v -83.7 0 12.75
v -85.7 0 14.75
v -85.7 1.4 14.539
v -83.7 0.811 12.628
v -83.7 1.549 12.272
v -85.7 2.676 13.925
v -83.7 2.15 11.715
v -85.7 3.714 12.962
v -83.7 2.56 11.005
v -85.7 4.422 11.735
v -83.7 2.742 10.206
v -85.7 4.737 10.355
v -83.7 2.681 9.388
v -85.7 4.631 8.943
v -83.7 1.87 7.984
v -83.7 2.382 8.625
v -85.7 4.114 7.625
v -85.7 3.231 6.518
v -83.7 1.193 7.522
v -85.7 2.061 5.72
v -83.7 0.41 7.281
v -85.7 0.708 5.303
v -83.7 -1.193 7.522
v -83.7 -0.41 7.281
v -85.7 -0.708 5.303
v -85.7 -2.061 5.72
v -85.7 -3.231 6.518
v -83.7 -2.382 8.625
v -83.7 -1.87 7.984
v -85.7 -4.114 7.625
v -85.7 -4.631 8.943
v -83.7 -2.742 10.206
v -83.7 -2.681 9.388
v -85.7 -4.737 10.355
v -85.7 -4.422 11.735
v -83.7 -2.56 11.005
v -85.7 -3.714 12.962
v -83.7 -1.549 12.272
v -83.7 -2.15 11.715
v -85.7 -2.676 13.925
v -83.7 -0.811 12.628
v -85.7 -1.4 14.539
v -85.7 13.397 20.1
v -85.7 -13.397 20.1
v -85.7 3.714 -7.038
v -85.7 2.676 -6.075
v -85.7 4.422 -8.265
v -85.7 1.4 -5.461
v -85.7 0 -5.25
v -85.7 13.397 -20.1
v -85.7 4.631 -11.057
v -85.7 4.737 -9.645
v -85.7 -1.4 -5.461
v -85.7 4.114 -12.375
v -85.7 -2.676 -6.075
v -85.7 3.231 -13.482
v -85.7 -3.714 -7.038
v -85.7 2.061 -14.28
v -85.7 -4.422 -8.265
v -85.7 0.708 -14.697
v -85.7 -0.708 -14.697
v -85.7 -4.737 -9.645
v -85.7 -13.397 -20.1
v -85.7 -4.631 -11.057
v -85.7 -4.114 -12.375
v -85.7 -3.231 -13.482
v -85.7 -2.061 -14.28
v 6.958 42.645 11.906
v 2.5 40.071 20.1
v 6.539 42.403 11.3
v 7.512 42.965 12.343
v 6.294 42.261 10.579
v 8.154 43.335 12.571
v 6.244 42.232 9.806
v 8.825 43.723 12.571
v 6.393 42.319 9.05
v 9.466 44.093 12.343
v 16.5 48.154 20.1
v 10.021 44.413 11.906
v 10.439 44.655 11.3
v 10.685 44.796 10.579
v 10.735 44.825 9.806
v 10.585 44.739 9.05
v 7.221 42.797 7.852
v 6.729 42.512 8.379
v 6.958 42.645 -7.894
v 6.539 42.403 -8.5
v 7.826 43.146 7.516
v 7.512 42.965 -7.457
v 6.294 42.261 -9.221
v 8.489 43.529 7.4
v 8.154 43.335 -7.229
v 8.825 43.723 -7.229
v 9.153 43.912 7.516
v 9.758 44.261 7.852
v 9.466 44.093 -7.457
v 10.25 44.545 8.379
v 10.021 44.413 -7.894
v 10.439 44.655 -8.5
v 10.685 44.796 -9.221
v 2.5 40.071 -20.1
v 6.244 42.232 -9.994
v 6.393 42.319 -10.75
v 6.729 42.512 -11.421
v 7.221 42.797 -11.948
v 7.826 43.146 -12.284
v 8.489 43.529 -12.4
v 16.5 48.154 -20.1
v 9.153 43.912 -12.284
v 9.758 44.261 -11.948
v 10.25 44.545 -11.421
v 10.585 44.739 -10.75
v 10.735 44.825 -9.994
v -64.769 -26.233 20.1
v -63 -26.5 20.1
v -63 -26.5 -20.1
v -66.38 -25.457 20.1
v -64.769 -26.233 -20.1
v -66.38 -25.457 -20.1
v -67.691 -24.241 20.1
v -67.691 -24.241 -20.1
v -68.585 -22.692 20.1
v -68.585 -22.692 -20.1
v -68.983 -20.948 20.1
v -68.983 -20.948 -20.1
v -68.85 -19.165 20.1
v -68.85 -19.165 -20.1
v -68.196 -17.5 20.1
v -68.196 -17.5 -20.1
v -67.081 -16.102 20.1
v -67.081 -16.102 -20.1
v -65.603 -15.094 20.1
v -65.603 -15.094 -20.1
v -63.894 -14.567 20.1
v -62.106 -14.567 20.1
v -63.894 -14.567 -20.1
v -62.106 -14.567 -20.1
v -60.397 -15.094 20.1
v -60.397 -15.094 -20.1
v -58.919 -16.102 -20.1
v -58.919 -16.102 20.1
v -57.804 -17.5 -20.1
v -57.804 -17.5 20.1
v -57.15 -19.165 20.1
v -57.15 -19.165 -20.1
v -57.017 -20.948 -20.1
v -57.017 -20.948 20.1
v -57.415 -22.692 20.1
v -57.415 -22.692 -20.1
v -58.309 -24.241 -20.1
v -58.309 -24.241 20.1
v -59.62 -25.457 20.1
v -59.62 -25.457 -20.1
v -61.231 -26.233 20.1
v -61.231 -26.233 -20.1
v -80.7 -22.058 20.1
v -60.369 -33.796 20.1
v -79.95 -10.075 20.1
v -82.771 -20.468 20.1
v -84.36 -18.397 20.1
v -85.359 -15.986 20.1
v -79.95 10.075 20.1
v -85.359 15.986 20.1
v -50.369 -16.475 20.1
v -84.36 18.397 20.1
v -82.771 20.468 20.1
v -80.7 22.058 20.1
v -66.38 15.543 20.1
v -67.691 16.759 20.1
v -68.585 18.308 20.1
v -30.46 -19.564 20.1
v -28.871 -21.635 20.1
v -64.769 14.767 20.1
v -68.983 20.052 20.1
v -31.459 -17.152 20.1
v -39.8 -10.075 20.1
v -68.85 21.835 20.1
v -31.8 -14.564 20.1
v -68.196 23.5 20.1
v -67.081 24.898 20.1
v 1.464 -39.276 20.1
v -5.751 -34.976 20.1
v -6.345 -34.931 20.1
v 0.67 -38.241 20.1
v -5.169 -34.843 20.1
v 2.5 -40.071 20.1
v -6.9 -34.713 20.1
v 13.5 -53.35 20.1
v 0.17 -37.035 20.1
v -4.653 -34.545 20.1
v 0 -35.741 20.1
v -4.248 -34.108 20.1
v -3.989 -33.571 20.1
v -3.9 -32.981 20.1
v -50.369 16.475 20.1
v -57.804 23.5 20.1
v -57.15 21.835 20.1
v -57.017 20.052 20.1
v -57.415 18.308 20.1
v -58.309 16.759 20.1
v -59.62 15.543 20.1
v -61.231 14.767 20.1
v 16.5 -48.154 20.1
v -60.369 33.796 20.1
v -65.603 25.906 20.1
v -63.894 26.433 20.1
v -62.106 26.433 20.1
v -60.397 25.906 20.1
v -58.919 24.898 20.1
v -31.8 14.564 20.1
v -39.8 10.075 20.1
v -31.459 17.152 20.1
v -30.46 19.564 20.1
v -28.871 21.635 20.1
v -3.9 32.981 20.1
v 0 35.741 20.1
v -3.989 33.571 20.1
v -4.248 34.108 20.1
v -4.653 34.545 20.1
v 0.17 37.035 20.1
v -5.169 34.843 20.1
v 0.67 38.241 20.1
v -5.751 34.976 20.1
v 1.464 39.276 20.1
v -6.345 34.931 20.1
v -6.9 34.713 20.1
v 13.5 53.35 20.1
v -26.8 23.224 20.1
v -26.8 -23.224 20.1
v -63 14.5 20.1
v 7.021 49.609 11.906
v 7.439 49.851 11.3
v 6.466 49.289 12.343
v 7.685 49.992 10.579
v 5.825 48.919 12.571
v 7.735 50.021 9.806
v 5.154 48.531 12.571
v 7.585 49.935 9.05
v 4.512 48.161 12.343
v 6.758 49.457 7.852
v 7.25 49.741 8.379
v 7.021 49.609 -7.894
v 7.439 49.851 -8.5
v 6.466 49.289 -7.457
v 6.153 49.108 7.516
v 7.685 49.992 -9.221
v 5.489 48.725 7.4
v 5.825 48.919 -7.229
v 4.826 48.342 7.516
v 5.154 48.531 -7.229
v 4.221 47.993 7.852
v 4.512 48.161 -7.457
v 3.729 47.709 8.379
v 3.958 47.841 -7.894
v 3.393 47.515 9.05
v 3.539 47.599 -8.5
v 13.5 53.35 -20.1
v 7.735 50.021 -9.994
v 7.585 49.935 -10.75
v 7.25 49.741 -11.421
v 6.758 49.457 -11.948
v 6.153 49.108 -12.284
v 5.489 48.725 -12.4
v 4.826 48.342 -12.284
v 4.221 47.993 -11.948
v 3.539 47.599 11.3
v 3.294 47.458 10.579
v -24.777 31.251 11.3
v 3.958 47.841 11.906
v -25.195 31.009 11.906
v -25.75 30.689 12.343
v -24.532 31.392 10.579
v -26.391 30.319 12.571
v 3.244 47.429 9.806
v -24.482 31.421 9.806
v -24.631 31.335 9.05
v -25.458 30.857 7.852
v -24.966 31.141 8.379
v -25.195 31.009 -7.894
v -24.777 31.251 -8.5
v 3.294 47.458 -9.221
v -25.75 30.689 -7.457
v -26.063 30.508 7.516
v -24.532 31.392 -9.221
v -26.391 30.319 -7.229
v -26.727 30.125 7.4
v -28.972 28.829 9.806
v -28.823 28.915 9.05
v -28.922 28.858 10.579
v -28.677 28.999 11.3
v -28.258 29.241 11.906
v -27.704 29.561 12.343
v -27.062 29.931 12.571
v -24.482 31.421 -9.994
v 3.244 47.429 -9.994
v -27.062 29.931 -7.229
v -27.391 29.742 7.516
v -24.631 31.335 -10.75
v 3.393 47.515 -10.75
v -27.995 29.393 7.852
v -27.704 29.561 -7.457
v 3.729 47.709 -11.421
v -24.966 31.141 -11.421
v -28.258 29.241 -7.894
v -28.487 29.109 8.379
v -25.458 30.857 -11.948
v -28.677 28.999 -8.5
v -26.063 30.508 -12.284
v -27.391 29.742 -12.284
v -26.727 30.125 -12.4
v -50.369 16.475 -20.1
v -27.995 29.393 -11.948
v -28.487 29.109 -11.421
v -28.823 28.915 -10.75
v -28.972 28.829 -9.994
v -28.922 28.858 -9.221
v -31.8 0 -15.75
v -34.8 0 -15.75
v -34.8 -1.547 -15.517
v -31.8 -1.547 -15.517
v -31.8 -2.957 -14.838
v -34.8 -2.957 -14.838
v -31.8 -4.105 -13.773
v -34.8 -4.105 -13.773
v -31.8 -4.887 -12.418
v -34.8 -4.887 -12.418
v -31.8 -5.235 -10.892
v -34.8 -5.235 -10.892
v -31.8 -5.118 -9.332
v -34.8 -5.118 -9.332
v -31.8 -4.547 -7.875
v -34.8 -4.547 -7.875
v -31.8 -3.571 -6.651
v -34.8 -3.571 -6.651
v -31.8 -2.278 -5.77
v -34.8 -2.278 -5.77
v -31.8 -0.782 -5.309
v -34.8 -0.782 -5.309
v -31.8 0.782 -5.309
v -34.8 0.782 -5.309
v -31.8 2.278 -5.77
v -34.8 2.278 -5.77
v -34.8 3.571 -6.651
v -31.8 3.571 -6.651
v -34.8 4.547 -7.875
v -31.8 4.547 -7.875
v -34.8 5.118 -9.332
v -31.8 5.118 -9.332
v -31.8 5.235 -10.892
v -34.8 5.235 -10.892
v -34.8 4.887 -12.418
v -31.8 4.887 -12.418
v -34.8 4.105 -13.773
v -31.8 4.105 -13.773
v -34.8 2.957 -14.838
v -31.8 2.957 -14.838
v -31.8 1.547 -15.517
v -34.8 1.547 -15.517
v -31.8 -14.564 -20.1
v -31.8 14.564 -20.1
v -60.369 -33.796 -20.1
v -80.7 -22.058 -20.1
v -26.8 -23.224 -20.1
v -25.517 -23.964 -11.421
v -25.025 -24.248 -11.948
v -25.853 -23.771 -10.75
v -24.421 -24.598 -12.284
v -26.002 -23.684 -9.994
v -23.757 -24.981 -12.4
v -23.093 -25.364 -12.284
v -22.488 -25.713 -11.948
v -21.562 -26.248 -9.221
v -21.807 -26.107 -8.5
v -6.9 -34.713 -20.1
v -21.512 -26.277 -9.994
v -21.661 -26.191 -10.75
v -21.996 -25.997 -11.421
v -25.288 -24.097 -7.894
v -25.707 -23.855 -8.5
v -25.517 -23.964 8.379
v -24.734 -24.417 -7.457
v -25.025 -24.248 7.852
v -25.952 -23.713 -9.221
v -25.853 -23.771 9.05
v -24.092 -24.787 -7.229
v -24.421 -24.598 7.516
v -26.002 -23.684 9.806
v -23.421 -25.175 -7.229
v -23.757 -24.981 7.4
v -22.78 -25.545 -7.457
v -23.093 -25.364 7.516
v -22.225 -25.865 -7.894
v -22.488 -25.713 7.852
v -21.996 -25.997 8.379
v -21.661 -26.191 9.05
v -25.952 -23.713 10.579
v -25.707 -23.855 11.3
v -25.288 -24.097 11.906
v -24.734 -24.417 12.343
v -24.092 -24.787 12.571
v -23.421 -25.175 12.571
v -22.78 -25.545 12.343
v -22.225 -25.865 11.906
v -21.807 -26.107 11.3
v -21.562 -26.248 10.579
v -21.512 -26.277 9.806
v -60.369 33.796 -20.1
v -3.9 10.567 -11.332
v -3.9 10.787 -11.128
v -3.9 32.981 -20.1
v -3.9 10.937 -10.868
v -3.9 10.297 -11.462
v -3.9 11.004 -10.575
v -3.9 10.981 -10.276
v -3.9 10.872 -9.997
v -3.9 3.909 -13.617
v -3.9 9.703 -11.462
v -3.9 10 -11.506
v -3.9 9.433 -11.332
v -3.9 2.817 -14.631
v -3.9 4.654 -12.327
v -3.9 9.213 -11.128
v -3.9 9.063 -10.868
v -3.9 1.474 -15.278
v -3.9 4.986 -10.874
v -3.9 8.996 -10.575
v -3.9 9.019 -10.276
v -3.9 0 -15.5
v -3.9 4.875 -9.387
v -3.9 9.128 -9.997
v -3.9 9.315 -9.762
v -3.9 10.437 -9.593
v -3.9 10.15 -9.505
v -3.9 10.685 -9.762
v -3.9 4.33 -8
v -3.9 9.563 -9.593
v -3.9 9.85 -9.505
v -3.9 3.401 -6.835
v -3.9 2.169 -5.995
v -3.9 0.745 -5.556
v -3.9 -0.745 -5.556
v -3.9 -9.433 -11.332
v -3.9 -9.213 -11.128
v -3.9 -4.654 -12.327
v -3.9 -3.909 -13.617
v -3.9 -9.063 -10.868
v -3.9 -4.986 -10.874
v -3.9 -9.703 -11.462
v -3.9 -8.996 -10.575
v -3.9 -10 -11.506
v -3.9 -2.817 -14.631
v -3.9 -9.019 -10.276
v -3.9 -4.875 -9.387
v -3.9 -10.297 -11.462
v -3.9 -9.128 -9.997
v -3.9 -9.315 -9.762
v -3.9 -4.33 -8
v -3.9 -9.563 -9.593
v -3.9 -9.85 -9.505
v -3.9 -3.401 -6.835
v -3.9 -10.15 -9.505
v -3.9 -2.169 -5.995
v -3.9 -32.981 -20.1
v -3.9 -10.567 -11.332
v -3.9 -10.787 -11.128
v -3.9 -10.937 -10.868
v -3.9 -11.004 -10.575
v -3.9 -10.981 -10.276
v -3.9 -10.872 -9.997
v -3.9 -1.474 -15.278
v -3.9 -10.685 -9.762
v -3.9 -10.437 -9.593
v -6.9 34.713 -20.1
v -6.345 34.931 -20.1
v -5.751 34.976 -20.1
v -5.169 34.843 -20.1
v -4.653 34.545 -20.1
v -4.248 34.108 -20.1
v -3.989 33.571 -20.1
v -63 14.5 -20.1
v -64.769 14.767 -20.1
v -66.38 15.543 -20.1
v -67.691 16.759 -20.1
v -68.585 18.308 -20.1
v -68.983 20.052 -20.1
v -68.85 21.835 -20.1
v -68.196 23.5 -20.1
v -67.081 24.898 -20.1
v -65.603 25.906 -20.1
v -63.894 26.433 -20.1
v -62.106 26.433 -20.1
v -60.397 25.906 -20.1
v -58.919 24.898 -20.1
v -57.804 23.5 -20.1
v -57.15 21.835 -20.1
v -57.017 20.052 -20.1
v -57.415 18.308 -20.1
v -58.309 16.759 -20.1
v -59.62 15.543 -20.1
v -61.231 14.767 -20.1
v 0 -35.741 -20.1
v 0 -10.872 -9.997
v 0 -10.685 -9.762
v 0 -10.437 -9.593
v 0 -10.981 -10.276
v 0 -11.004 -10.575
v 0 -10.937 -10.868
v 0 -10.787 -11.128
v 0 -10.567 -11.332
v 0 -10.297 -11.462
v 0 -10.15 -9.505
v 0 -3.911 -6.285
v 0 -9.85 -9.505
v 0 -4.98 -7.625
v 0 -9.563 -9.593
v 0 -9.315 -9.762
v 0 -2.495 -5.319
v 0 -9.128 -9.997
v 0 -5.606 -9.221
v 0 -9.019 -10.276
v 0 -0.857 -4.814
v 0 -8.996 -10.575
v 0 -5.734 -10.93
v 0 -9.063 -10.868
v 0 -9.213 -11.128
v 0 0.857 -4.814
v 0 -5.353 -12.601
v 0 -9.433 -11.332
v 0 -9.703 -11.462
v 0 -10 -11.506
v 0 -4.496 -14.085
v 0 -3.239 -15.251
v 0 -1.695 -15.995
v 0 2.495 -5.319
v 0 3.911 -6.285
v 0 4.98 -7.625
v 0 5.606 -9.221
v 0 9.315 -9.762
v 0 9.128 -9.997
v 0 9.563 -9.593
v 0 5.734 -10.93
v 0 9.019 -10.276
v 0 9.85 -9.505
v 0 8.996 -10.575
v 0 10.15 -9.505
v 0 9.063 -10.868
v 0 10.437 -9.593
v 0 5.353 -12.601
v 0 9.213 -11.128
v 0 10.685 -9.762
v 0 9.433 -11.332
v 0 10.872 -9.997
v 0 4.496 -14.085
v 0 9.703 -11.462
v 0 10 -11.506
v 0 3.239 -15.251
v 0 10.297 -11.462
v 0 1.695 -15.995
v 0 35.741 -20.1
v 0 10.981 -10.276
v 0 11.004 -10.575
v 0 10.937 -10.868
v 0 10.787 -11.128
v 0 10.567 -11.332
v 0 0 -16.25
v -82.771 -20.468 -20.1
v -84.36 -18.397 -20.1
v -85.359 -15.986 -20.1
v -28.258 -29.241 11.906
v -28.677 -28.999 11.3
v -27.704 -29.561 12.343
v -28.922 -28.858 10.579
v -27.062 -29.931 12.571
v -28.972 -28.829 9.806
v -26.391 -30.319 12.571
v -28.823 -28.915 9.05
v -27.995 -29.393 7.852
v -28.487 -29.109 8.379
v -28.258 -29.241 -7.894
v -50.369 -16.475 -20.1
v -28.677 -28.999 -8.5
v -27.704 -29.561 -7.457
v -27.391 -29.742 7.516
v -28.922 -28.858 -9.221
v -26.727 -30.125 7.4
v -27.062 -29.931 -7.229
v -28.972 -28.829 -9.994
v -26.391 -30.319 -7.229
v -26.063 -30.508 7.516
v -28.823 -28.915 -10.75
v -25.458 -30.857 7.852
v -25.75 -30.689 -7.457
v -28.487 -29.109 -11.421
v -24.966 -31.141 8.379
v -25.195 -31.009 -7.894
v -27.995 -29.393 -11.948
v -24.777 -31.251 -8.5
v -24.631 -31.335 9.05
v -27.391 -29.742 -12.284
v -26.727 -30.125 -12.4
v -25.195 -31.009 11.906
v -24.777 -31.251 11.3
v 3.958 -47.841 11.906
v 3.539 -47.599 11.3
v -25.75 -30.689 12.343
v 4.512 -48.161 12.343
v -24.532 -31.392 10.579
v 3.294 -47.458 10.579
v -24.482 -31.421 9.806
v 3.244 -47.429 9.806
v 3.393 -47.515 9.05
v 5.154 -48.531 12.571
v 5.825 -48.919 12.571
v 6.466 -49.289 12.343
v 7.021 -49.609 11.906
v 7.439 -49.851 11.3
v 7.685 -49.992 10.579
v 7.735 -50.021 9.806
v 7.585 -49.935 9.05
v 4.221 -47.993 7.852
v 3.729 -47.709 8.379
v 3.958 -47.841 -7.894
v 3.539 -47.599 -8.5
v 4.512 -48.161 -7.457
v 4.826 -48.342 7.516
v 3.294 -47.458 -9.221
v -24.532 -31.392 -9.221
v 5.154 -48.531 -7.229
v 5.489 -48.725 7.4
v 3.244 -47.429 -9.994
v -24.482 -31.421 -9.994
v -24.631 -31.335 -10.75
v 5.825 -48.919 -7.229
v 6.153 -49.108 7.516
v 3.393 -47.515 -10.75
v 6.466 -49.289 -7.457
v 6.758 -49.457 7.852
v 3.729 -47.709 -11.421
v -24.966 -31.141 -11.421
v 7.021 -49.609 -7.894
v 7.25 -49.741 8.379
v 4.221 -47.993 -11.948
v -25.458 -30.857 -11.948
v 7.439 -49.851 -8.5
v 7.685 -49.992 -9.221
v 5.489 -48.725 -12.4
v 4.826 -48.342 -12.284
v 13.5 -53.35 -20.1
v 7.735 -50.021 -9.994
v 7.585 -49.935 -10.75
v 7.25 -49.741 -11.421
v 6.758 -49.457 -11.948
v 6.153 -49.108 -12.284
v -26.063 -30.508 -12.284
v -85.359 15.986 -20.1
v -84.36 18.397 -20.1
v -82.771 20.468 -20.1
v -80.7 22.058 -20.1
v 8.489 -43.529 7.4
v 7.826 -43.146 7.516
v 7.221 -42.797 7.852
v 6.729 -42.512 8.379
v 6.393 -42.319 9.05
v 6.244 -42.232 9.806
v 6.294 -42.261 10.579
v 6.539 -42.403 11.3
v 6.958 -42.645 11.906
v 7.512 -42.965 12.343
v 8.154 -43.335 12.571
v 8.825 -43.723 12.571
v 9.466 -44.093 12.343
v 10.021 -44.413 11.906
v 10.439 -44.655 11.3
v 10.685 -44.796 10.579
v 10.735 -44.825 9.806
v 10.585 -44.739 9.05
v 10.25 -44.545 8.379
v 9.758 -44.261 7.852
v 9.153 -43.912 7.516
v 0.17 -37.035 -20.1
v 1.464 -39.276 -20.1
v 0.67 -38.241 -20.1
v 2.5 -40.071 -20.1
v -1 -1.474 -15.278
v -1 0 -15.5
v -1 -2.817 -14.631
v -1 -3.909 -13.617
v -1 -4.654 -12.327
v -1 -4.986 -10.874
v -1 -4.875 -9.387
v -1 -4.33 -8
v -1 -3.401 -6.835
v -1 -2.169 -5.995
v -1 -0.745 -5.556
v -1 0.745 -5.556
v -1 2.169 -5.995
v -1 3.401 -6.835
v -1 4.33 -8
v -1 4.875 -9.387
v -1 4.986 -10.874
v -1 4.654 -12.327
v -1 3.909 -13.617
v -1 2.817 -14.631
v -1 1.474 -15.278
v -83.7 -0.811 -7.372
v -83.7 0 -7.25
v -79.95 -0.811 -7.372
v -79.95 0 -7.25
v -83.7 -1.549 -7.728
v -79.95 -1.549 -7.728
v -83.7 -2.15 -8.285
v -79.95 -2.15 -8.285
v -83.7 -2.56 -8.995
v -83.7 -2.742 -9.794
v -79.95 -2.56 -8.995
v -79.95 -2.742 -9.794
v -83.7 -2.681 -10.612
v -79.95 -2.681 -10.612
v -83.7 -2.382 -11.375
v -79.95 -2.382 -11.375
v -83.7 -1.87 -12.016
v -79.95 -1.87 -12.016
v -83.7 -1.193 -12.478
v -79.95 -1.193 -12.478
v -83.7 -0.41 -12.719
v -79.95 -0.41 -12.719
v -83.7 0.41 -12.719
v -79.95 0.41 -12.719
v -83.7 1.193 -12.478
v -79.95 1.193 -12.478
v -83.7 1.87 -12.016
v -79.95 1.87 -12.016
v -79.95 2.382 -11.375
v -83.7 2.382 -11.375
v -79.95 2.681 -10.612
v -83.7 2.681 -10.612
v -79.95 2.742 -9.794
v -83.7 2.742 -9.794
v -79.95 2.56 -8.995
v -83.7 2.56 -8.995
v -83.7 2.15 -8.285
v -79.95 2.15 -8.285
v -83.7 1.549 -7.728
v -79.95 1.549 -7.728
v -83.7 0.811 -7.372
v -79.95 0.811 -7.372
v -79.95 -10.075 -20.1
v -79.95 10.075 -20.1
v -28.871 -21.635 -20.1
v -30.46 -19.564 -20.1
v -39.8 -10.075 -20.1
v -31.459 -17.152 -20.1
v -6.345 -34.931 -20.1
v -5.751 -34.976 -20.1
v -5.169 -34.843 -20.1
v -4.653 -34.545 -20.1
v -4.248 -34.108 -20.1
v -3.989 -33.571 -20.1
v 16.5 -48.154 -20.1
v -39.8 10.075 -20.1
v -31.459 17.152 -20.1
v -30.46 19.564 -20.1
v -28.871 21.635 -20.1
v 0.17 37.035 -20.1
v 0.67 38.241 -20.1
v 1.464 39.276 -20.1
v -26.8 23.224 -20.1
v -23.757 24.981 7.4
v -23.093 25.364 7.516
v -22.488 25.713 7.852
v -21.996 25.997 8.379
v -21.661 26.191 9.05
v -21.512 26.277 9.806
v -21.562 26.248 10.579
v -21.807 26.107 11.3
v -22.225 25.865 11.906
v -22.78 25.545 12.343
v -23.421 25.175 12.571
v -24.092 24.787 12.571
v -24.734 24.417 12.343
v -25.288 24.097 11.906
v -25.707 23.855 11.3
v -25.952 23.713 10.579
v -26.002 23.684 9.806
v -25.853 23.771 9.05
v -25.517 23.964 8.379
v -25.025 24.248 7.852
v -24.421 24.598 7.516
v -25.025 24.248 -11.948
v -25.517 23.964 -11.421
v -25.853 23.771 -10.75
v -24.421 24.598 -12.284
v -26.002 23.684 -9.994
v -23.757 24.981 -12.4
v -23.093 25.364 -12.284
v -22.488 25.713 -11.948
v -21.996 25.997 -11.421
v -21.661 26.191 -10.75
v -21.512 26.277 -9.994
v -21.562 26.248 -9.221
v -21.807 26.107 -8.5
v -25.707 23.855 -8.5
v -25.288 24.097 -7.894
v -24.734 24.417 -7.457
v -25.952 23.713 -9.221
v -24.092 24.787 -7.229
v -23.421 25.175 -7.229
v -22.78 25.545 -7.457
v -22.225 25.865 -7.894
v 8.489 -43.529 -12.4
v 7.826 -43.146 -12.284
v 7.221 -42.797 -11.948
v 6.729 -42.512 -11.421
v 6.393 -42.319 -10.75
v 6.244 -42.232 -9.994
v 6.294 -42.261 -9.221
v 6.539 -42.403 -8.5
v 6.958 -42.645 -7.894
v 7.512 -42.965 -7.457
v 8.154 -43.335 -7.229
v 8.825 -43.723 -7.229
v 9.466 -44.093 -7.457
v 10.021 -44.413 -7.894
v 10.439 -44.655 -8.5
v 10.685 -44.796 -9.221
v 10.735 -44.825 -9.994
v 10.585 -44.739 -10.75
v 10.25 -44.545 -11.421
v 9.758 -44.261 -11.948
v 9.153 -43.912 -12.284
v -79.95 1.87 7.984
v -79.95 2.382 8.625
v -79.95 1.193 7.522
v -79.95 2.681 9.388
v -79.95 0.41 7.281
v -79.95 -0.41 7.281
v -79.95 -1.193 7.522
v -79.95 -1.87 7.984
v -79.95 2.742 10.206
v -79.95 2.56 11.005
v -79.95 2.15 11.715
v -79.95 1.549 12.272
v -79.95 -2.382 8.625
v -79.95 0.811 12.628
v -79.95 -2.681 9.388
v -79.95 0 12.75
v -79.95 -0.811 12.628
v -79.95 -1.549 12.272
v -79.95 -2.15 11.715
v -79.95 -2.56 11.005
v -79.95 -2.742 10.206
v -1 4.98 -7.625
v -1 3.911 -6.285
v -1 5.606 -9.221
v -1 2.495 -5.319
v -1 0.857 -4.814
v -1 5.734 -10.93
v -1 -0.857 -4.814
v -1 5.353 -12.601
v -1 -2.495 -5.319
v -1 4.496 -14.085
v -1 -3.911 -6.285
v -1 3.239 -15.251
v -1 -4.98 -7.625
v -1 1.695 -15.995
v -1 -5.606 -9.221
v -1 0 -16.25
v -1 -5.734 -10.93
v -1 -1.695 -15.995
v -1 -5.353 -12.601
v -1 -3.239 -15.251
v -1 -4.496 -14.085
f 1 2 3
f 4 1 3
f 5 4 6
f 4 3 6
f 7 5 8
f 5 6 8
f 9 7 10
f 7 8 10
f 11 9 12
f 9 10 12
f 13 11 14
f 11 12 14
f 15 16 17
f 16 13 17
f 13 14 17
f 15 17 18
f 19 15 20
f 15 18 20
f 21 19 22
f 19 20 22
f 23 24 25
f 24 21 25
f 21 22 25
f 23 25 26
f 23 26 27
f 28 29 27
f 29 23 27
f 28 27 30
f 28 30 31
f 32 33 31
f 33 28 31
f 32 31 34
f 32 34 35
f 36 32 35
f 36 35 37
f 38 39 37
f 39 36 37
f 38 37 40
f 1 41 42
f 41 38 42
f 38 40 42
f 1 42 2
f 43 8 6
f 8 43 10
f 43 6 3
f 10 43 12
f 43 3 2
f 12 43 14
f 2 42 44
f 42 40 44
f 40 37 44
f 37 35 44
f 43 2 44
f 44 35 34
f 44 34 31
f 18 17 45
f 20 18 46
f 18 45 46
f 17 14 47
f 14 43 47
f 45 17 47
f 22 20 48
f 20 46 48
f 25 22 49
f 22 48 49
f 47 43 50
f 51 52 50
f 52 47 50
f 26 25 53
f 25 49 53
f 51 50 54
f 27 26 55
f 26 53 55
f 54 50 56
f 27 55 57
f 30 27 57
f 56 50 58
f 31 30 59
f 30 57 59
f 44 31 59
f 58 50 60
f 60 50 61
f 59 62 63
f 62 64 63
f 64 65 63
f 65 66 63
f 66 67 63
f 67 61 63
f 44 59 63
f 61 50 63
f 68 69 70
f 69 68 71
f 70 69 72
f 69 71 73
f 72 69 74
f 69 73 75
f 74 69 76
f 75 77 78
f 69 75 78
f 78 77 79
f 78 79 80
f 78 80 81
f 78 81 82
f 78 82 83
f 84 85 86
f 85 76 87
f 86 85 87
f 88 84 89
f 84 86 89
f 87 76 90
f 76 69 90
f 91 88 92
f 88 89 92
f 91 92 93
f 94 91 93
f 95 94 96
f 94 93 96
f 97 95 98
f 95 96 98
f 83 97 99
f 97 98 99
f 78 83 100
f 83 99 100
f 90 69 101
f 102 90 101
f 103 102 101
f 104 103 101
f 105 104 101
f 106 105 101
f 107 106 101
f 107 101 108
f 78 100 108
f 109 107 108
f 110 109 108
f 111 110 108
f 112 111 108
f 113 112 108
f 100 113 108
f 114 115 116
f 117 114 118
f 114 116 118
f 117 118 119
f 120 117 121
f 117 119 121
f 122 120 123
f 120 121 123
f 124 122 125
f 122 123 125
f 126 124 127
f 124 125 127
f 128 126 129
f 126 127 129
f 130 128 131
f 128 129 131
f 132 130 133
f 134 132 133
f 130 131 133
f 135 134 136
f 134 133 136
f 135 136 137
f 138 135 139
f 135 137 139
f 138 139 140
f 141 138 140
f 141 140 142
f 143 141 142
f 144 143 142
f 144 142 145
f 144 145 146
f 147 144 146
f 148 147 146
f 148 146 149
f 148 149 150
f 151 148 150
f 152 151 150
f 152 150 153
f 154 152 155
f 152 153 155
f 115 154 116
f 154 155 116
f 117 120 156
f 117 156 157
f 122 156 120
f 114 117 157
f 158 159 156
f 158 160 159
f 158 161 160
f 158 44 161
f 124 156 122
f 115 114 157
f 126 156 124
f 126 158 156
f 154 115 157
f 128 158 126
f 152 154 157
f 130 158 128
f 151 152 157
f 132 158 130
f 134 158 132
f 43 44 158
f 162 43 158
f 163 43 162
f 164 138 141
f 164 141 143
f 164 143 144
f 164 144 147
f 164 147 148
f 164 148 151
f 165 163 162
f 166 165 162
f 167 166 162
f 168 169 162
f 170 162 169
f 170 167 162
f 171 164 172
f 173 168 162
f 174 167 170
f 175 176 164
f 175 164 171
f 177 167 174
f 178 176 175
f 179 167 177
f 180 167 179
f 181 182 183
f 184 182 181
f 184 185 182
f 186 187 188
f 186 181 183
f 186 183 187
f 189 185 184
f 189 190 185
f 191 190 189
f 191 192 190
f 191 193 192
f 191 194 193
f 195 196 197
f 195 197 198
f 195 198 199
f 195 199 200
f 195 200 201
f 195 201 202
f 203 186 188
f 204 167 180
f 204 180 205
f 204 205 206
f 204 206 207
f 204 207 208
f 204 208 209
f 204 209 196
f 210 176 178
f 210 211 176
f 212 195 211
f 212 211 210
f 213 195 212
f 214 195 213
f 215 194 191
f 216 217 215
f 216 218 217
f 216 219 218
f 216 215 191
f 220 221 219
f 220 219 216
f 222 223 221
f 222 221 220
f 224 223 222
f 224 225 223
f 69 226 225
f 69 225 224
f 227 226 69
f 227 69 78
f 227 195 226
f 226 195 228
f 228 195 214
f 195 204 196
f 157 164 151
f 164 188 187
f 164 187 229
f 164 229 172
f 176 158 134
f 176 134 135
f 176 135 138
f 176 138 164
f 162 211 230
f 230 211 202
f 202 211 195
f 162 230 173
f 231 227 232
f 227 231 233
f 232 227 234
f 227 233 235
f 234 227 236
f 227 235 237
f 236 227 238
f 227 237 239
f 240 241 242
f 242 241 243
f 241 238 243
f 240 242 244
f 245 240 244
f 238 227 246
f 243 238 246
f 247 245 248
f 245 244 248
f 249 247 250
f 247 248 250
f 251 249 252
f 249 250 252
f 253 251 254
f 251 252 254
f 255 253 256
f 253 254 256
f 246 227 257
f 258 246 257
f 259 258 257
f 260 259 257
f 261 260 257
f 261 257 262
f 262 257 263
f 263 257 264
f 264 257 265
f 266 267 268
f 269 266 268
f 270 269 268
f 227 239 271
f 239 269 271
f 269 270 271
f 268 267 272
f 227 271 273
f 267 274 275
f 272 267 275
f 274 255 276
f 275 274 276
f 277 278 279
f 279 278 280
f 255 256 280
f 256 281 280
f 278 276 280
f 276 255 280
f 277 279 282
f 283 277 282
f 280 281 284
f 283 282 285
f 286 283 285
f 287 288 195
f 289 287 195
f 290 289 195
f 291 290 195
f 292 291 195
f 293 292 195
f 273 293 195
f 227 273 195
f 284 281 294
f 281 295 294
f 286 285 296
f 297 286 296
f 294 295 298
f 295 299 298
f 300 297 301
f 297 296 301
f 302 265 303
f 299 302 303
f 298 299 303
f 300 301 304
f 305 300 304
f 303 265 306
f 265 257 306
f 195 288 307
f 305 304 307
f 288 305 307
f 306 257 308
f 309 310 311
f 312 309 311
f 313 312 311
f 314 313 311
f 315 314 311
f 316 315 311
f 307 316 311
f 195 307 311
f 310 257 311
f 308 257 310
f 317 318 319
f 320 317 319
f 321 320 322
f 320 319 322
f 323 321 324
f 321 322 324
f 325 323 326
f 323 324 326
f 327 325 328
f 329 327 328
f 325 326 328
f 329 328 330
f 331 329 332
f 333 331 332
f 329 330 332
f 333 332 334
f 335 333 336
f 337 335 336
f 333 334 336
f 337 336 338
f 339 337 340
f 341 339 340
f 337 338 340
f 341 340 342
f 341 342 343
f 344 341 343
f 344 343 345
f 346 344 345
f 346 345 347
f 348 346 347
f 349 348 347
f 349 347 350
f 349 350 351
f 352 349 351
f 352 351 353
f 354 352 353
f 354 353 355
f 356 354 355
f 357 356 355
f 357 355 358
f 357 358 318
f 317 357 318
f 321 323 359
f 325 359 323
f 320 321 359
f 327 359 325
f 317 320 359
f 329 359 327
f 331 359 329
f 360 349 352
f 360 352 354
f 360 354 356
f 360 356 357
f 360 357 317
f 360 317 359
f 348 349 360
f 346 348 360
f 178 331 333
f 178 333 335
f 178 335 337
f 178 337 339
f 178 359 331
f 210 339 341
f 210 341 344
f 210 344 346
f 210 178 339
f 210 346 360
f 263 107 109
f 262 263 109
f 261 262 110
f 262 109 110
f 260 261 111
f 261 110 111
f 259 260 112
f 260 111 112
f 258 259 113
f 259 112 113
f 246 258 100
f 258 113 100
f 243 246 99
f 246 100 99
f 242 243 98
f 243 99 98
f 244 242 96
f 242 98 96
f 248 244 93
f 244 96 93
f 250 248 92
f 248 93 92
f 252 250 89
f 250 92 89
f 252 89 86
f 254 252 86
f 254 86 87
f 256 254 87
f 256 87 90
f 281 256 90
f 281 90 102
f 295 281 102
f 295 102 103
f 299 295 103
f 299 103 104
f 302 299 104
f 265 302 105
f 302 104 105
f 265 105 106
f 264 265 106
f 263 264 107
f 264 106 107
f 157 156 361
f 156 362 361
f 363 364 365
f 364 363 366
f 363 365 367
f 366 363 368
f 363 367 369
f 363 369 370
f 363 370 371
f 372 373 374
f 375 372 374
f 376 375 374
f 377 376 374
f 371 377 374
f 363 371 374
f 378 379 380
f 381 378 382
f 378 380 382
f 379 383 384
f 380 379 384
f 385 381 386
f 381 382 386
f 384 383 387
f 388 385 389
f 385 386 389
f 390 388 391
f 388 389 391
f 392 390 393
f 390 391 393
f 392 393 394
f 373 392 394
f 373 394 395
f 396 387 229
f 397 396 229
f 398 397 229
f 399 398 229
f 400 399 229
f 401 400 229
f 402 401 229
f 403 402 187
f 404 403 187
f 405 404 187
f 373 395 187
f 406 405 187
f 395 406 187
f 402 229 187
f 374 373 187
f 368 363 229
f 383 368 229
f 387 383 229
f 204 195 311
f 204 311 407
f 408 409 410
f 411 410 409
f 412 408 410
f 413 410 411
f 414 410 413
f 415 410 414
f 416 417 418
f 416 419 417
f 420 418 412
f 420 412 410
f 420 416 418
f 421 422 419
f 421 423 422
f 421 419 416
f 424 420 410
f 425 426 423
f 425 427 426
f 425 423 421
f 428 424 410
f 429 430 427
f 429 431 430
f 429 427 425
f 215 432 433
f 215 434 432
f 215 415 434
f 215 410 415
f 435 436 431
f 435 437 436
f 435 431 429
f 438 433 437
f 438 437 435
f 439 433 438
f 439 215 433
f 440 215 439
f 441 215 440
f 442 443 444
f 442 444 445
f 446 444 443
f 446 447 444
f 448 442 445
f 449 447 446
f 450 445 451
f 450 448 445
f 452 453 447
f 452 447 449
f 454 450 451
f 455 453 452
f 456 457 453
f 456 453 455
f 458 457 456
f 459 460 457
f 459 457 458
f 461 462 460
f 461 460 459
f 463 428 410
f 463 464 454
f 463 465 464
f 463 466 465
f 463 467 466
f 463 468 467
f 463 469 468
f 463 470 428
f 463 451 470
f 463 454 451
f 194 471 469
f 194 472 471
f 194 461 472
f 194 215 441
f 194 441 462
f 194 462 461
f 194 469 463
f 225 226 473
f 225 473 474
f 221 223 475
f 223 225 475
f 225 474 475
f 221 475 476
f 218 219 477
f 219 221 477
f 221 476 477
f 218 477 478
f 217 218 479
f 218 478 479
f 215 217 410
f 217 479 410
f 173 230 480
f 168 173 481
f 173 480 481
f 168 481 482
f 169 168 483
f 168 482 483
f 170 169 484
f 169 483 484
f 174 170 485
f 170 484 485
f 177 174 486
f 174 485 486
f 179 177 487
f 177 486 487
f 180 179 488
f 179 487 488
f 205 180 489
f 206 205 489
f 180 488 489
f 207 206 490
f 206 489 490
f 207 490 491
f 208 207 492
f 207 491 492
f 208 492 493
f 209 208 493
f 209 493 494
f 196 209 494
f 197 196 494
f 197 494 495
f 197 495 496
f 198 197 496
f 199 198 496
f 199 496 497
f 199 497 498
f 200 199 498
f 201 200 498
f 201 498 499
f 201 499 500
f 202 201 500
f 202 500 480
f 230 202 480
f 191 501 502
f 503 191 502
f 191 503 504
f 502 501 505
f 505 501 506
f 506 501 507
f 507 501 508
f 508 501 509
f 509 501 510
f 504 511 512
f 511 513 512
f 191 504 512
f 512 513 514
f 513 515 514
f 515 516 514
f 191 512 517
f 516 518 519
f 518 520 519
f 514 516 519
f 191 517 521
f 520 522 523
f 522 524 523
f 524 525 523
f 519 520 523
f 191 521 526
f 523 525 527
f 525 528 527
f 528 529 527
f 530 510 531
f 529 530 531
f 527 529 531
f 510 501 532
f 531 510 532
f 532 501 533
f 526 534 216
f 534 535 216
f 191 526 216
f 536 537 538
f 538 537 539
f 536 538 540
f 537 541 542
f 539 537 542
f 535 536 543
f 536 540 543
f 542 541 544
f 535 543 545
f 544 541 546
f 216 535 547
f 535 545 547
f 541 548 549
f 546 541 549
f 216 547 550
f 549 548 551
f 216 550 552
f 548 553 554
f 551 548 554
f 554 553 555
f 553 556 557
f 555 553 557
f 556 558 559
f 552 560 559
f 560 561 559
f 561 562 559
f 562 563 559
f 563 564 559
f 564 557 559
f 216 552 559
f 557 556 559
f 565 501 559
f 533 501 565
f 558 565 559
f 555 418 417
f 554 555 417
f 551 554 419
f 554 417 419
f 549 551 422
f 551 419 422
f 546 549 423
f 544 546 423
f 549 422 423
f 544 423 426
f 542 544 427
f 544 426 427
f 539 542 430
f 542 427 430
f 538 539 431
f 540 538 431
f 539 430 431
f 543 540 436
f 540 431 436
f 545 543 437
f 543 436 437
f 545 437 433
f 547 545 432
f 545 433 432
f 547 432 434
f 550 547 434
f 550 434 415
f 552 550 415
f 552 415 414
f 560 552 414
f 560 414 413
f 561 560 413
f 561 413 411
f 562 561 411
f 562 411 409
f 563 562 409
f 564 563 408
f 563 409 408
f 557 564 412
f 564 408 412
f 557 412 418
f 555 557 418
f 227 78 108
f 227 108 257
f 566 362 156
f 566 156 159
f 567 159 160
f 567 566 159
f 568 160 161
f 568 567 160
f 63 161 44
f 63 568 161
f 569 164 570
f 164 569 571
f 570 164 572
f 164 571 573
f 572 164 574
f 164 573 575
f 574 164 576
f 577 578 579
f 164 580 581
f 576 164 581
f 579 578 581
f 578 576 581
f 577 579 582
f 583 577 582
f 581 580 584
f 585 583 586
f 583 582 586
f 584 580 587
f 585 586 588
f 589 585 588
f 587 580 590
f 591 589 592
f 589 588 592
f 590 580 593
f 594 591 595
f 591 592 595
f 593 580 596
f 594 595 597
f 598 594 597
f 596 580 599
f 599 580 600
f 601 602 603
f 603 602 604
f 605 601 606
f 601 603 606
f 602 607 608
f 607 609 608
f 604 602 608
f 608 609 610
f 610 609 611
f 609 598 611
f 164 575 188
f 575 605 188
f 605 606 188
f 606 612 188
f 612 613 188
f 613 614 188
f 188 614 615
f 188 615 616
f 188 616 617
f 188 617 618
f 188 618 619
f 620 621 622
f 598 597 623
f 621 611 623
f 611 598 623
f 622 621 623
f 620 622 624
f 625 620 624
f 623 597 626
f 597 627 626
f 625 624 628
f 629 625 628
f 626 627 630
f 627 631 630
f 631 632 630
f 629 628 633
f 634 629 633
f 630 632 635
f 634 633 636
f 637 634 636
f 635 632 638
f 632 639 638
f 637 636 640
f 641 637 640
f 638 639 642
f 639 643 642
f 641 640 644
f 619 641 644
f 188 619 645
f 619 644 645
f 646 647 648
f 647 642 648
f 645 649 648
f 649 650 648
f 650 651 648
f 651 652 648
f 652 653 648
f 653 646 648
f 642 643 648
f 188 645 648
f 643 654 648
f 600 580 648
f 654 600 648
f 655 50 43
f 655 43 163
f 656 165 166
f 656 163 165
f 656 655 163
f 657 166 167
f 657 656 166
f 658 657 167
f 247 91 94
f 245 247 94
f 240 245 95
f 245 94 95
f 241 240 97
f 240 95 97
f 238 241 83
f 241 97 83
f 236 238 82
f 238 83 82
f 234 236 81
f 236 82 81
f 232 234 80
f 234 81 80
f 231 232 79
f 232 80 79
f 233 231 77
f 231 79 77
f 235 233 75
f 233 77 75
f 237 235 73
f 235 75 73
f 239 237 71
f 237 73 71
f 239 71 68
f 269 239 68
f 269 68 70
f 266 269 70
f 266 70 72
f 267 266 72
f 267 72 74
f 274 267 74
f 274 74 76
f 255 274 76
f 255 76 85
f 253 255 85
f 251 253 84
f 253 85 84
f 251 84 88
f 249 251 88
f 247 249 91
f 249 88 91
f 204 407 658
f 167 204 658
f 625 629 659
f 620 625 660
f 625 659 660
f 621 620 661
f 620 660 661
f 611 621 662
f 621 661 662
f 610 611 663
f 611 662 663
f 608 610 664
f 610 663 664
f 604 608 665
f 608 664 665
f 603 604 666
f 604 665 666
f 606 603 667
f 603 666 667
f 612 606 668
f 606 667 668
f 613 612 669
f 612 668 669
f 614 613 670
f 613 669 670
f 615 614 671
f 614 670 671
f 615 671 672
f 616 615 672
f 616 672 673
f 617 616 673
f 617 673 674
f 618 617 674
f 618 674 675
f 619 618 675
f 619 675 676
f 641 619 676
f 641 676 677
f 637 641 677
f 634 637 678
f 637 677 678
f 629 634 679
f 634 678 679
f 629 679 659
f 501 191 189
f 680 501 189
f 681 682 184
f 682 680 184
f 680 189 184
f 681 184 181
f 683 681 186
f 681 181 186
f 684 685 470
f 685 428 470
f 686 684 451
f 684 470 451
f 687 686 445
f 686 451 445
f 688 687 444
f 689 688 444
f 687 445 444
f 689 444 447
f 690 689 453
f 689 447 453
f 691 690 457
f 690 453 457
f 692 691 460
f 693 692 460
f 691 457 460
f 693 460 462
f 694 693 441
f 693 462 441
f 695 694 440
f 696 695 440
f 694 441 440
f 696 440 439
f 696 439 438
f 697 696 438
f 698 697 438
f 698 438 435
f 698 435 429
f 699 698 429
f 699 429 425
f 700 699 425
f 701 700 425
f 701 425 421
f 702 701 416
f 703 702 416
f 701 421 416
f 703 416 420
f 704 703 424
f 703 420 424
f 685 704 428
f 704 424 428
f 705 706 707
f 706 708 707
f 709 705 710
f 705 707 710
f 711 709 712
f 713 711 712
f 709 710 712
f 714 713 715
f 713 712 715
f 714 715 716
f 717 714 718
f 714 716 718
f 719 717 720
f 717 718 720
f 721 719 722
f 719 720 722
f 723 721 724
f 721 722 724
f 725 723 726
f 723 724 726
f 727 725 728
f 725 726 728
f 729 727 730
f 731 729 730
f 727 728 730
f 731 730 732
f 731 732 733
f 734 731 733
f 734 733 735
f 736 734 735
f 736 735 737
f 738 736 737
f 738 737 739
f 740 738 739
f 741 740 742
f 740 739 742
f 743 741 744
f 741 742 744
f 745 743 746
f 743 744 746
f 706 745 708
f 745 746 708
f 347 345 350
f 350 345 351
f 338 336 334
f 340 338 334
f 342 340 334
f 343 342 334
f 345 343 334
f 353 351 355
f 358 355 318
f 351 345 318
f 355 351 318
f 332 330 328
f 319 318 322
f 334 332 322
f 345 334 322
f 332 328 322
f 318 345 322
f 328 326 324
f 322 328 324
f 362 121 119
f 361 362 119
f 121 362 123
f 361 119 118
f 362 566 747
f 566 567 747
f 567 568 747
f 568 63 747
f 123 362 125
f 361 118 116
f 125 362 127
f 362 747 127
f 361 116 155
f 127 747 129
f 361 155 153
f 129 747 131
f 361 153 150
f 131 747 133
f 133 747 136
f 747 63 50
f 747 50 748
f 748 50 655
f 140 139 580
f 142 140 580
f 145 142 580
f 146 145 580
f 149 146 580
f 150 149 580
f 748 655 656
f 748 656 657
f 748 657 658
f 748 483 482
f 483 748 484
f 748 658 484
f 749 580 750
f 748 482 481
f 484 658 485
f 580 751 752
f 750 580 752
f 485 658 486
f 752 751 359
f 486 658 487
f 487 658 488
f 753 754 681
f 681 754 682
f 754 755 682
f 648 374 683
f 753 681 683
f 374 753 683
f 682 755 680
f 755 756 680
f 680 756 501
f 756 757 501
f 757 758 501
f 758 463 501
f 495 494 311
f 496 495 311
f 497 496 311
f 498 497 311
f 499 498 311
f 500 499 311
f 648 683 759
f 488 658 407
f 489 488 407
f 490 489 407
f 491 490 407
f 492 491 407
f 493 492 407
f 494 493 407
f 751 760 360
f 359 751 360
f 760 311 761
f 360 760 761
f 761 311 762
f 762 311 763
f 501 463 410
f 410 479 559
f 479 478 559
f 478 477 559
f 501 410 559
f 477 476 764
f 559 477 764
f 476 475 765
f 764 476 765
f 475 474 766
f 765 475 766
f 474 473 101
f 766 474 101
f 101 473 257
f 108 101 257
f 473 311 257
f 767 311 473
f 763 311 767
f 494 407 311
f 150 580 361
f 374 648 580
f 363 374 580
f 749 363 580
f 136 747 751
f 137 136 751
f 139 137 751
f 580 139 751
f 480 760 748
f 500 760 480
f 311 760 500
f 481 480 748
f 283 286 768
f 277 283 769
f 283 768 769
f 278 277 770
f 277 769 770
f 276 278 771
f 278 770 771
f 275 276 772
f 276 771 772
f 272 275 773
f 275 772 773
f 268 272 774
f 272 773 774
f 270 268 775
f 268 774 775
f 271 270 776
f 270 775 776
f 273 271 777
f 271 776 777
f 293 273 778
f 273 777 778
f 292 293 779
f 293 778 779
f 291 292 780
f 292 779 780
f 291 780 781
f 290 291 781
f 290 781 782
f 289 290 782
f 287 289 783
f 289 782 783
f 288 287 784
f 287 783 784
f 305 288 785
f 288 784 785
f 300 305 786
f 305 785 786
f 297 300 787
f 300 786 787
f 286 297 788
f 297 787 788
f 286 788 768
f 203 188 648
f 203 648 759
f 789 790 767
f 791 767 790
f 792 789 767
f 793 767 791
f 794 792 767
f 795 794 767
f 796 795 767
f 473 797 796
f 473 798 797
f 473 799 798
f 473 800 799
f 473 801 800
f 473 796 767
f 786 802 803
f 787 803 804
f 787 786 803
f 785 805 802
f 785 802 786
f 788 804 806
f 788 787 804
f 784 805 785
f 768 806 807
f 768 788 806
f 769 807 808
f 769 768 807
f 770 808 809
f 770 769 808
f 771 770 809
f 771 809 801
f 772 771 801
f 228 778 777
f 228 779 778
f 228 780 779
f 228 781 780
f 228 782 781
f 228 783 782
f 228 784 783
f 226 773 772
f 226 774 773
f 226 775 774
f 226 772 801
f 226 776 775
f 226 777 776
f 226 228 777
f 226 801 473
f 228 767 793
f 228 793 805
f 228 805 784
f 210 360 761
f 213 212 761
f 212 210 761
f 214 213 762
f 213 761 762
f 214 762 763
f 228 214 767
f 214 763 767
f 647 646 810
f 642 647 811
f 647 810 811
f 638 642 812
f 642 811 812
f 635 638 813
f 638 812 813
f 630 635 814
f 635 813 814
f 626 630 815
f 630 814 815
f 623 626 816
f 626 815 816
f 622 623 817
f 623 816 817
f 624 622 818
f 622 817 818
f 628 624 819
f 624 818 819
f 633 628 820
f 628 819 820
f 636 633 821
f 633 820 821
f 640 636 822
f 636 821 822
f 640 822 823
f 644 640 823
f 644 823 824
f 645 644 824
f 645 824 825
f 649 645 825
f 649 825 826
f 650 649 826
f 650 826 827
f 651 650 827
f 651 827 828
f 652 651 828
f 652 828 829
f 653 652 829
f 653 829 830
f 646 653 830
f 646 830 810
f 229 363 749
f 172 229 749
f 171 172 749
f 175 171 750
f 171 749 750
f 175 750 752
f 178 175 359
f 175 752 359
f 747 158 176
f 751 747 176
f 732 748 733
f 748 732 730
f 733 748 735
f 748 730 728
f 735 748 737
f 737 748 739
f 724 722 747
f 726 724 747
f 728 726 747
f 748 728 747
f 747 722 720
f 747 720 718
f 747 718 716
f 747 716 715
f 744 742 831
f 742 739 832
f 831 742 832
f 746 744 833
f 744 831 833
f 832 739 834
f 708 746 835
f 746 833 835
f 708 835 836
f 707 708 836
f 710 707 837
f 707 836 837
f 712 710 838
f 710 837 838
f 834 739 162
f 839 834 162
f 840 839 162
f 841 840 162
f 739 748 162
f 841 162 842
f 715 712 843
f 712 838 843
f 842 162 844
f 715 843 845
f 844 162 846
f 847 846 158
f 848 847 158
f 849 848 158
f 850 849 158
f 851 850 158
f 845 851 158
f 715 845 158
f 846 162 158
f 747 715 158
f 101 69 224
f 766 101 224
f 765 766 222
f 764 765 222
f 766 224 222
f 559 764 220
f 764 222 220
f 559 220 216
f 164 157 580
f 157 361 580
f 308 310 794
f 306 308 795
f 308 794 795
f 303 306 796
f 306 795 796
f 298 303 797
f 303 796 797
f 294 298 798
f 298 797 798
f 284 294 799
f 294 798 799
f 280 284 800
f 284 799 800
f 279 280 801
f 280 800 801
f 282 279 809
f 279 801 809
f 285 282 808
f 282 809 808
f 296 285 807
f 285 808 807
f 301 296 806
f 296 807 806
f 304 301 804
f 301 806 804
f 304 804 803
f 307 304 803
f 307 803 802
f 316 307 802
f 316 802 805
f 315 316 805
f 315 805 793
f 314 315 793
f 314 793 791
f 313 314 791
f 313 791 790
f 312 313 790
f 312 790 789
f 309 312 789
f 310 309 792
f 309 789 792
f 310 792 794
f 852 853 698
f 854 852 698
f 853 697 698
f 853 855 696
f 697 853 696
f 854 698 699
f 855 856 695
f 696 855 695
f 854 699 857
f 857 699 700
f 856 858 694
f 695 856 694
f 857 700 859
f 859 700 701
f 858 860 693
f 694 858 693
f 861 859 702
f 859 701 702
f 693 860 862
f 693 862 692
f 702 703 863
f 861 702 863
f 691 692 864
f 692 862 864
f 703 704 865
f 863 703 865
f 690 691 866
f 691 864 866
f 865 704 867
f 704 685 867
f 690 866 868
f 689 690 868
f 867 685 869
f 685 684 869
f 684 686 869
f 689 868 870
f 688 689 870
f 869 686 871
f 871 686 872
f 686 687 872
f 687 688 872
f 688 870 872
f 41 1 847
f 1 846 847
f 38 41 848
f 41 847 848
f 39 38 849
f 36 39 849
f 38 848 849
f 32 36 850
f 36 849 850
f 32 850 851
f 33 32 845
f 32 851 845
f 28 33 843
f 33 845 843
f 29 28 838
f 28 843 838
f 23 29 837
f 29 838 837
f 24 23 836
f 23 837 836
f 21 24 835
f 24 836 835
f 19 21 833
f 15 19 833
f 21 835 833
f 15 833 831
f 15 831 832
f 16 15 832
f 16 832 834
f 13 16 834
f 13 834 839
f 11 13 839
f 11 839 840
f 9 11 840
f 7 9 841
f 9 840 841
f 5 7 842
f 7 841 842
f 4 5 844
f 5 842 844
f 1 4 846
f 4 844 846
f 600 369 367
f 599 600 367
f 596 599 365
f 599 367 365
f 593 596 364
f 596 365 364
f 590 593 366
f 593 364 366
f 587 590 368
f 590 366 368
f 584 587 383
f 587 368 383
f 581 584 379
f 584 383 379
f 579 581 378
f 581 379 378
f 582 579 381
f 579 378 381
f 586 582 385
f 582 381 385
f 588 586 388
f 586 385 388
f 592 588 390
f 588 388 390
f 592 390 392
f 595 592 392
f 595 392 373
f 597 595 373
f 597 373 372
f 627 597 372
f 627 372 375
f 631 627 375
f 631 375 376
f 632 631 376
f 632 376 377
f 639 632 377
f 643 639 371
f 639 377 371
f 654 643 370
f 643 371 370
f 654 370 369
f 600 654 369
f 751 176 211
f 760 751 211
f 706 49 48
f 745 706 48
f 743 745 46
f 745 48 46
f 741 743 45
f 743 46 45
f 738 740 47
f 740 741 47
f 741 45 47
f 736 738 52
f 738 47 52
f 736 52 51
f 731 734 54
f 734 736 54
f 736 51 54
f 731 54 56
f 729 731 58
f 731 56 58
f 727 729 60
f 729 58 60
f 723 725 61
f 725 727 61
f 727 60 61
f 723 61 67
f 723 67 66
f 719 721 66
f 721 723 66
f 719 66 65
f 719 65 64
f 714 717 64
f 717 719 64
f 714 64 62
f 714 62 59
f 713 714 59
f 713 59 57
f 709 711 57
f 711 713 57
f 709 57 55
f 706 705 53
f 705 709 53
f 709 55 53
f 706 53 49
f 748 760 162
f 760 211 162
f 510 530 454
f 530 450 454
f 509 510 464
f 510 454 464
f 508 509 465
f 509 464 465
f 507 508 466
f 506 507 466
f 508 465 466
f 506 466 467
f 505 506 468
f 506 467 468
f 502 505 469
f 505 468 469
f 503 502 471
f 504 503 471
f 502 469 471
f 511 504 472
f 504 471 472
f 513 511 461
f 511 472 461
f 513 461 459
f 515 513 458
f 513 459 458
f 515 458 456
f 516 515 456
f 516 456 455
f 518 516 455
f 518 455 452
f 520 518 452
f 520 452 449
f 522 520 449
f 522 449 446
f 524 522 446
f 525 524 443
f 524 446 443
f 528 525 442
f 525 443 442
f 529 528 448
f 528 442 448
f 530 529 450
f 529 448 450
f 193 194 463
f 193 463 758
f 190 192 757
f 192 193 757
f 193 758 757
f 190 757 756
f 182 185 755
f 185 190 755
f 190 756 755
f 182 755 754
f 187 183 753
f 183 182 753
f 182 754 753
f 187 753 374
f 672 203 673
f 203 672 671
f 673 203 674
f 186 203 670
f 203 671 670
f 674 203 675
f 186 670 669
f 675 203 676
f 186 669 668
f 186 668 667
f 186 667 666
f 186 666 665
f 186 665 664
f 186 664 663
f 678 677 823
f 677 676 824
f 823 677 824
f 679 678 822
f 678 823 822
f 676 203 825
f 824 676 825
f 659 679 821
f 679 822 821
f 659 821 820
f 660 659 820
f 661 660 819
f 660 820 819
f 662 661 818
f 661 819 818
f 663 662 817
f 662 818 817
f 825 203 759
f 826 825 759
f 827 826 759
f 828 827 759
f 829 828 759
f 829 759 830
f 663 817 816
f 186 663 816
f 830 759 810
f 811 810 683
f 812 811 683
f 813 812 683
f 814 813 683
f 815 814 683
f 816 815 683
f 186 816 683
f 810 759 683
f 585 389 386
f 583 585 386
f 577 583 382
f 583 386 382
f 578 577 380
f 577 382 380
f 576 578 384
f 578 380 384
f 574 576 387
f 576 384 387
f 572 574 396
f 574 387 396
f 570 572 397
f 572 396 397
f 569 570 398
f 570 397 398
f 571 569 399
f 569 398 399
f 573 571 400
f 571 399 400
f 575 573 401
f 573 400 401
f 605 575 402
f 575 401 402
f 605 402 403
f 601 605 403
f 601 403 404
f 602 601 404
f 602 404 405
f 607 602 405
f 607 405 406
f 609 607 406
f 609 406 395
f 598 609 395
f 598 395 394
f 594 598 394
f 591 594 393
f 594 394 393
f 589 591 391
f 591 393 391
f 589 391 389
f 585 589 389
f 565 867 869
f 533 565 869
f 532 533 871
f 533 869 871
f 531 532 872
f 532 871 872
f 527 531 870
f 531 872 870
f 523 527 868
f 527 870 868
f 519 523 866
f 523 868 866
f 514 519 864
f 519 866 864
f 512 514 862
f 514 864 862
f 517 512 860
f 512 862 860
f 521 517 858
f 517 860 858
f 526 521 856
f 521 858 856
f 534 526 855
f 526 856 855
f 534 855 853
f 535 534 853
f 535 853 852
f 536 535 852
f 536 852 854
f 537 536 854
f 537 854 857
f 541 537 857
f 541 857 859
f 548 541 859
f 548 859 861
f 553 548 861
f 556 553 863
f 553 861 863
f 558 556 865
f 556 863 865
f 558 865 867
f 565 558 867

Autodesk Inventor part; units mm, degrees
ref_plane "YZ Plane" through (0, 0, 0) normal (1, 0, 0) x (0, 1, 0)
ref_plane "XZ Plane" through (0, 0, 0) normal (0, 1, 0) x (-1, 0, 0)
ref_plane "XY Plane" through (0, 0, 0) normal (0, 0, 1) x (1, 0, 0)
sketch "Esquisse1" plane through (0, 0, 0) normal (0, 0, 1) x (1, 0, 0)
  line L0 (0, 0) -> (0, 38.6276)
  line L1 (0, 38.6276) -> (16.5, 48.1538)
  line L2 (16.5, 48.1538) -> (13.5, 53.35)
  line L3 (13.5, 53.35) -> (-50.3694, 16.475)
  line L4 (-50.3694, 16.475) -> (-60.3694, 33.7955)
  line L5 (-60.3694, 33.7955) -> (-80.7, 22.0576)
  line L6 (-85.7, 13.3974) -> (-85.7, 0)
  line L7 (-85.7, 0) -> (0, 0)
  arc A0 (-80.7, 22.0576) -> (-85.7, 13.3974) centre (-75.7, 13.3974) ccw
  line L8 (-79.9, 0) -> (-39.75, 0) construction
  line L9 (-39.75, 0) -> (-39.75, 10.075) construction
  line L10 (-39.75, 10.075) -> (-79.9, 10.075) construction
  line L11 (-79.9, 10.075) -> (-79.9, 0) construction
  dimension "d0" = 20
  dimension "d1" = 73.75
  dimension "d3" = 6
  dimension "d4" = 16.5
  dimension "d7" = 85.7
  dimension "d32" = 40.15
  dimension "d33" = 5.8
  dimension "d34" = 10.075
  dimension "d35" = 6.4
  dimension "d38" = 120
  dimension "d39" = 10
extrude "Embase" add sketch "Esquisse1" along normal mid plane 40.2
mirror "Symétrie1" about plane through (-85.7, 0, 0) normal (0, -1, 0) of "Embase"
sketch "Esquisse2" plane through (0, 0, 20.1) normal (0, 0, 1) x (1, 0, 0)
  line L0 (-79.95, -10.075) -> (-39.8, -10.075)
  line L1 (-39.8, -10.075) -> (-39.8, 10.075)
  line L2 (-39.8, 10.075) -> (-79.95, 10.075)
  line L3 (-79.95, 10.075) -> (-79.95, -10.075)
  line L4 (0, 38.6276) -> (0, -38.6276) projected
  line L5 (-85.7, 13.3974) -> (-85.7, -13.3974) projected
  point P0 (0, 0)
  point P1 (-39.8, 0)
  point P2 (0, 0)
  dimension "d14" = 20.15
  dimension "d15" = 40.15
  dimension "d16" = 5.75
extrude "Passage profilé vertical" cut sketch "Esquisse2" against normal through all
sketch "Esquisse3" plane through (0, 0, 20.1) normal (0, 0, 1) x (1, 0, 0)
  line L0 (-31.8, -20.3371) -> (-31.8, 20.3371)
  line L1 (-31.8, 20.3371) -> (-3.9, 36.4452)
  line L2 (-3.9, 36.4452) -> (-3.9, -36.4452)
  line L3 (-31.8, -20.3371) -> (-3.9, -36.4452)
  line L4 (0, 38.6276) -> (0, -38.6276) projected
  line L5 (13.5, 53.35) -> (-50.3694, 16.475) projected
  line L6 (13.5, -53.35) -> (-50.3694, -16.475) projected
  point P0 (0, 0)
  dimension "d19" = 27.9
  dimension "d20" = 3.9
  dimension "d21" = 5.94
  dimension "d22" = 5.94
extrude "Passage courroie" cut sketch "Esquisse3" against normal through all
fillet "Congé1" radius 10 2 edges at (-31.8, -20.3371, 0) (-31.8, 20.3371, 0)
fillet "Congé1" radius 2 2 edges at (-3.9, -36.4452, 0) (-3.9, 36.4452, 0)
fillet "Congé1" radius 5 2 edges at (0, -38.6276, 0) (0, 38.6276, 0)
sketch "Esquisse7" plane through (0, 0, 20.1) normal (0, 0, 1) x (1, 0, 0)
  point P0 (0, 0)
  point P1 (-63, -20.5)
  point P2 (-63, 20.5)
  dimension "d51" = 20.5
  dimension "d52" = 63
  dimension "d53" = 20.5
  dimension "d54" = 63
hole "Passage axe" at (-63, -20.5, 20.1) at (-63, 20.5, 20.1) direction (0, 0, -1) diameter 12 end through all
sketch "Esquisse8" plane through (-85.7, 13.3974, -20.1) normal (-1, 0, 0) x (0, 0, 1)
  point P0 (20.1, -13.3974)
  point P1 (10.1, -13.3974)
  point P2 (30.1, -13.3974)
  dimension "d55" = 20
  dimension "d56" = 10
hole "Maintient profilé vertical" at (-85.7, 0, -10) at (-85.7, 0, 10) direction (1, 0, 0) diameter 5.5 end up to surface countersink diameter 9.5 countersink angle 90
sketch "Esquisse9" plane through (-50.3694, -16.475, -20.1) normal (-0.5, -0.8660254, 0) x (0.8660254, -0.5, 0)
  line L0 (0, 0) -> (73.75, 0) projected
  line L1 (73.75, 40.2) -> (0, 40.2) projected
  line L2 (73.75, 40.2) -> (73.75, 0) projected
  point P0 (35.3837, 20.1)
  point P1 (27.3, 30.1)
  point P2 (27.3, 10.3)
  point P3 (64.5, 30.1)
  point P4 (64.5, 10.3)
  dimension "d64" = 37.2
  dimension "d66" = 10.3
  dimension "d67" = 10.1
  dimension "d68" = 9.25
hole "Maintient profilé horizonal" at (-26.7269, -30.125, 10) at (-26.7269, -30.125, -9.8) at (5.4893, -48.725, 10) at (5.4893, -48.725, -9.8) direction (0.5, 0.8660254, 0) diameter 5.2 depth 8 tip angle 118
mirror "Symétrie2" about plane through (0, 0, 0) normal (0, 1, 0) of "Maintient profilé horizonal"
sketch "Esquisse10" plane through (0, -35.7408, 20.1) normal (1, 0, 0) x (0, 0, -1)
  line L0 (40.2, 71.4816) -> (40.2, 0) projected
  point P0 (20.1, 35.7408)
  point P1 (30.6, 35.7408)
  dimension "d76" = 9.6
hole "Perçage roulement a bille" at (0, 0, -10.5) direction (-1, 0, 0) diameter 10 depth 10 tip angle 118 counterbore diameter 11.5 counterbore depth 1
sketch "Esquisse11" plane through (0, -35.7408, 20.1) normal (1, 0, 0) x (0, 0, -1)
  circle A0 centre (30.6, 35.7408) radius 5 construction
  point P0 (20.1, 35.7408)
  point P1 (30.6, 25.7408)
  point P2 (30.6, 45.7408)
  dimension "d84" = 20
  dimension "d85" = 10
hole "Taraudage plaque de maintient" at (0, -10, -10.5) at (0, 10, -10.5) direction (-1, 0, 0) diameter 2.013 depth 7.6 tip angle 118 thread size "M2.5x0.45" class "6H" standard "ISO Metric profile"
sketch "Esquisse12" plane through (-31.8, -14.5636, 20.1) normal (1, 0, 0) x (0, 0, -1)
  circle A0 centre (30.6, 14.5636) radius 5 construction
  point P0 (20.1, 14.5636)
hole "Perçage roulement a bille intérieur" at (-31.8, 0, -10.5) direction (-1, 0, 0) diameter 10.5 depth 3
equation "\"d22\" = d21"
equation "\"d53\" = d51"
equation "\"d54\" = d52"
equation "\"d56\" = 0.5 * d55"
equation "\"d85\" = 0.5 * d84"
properties part number "Coins superieur" material "Aluminium"
